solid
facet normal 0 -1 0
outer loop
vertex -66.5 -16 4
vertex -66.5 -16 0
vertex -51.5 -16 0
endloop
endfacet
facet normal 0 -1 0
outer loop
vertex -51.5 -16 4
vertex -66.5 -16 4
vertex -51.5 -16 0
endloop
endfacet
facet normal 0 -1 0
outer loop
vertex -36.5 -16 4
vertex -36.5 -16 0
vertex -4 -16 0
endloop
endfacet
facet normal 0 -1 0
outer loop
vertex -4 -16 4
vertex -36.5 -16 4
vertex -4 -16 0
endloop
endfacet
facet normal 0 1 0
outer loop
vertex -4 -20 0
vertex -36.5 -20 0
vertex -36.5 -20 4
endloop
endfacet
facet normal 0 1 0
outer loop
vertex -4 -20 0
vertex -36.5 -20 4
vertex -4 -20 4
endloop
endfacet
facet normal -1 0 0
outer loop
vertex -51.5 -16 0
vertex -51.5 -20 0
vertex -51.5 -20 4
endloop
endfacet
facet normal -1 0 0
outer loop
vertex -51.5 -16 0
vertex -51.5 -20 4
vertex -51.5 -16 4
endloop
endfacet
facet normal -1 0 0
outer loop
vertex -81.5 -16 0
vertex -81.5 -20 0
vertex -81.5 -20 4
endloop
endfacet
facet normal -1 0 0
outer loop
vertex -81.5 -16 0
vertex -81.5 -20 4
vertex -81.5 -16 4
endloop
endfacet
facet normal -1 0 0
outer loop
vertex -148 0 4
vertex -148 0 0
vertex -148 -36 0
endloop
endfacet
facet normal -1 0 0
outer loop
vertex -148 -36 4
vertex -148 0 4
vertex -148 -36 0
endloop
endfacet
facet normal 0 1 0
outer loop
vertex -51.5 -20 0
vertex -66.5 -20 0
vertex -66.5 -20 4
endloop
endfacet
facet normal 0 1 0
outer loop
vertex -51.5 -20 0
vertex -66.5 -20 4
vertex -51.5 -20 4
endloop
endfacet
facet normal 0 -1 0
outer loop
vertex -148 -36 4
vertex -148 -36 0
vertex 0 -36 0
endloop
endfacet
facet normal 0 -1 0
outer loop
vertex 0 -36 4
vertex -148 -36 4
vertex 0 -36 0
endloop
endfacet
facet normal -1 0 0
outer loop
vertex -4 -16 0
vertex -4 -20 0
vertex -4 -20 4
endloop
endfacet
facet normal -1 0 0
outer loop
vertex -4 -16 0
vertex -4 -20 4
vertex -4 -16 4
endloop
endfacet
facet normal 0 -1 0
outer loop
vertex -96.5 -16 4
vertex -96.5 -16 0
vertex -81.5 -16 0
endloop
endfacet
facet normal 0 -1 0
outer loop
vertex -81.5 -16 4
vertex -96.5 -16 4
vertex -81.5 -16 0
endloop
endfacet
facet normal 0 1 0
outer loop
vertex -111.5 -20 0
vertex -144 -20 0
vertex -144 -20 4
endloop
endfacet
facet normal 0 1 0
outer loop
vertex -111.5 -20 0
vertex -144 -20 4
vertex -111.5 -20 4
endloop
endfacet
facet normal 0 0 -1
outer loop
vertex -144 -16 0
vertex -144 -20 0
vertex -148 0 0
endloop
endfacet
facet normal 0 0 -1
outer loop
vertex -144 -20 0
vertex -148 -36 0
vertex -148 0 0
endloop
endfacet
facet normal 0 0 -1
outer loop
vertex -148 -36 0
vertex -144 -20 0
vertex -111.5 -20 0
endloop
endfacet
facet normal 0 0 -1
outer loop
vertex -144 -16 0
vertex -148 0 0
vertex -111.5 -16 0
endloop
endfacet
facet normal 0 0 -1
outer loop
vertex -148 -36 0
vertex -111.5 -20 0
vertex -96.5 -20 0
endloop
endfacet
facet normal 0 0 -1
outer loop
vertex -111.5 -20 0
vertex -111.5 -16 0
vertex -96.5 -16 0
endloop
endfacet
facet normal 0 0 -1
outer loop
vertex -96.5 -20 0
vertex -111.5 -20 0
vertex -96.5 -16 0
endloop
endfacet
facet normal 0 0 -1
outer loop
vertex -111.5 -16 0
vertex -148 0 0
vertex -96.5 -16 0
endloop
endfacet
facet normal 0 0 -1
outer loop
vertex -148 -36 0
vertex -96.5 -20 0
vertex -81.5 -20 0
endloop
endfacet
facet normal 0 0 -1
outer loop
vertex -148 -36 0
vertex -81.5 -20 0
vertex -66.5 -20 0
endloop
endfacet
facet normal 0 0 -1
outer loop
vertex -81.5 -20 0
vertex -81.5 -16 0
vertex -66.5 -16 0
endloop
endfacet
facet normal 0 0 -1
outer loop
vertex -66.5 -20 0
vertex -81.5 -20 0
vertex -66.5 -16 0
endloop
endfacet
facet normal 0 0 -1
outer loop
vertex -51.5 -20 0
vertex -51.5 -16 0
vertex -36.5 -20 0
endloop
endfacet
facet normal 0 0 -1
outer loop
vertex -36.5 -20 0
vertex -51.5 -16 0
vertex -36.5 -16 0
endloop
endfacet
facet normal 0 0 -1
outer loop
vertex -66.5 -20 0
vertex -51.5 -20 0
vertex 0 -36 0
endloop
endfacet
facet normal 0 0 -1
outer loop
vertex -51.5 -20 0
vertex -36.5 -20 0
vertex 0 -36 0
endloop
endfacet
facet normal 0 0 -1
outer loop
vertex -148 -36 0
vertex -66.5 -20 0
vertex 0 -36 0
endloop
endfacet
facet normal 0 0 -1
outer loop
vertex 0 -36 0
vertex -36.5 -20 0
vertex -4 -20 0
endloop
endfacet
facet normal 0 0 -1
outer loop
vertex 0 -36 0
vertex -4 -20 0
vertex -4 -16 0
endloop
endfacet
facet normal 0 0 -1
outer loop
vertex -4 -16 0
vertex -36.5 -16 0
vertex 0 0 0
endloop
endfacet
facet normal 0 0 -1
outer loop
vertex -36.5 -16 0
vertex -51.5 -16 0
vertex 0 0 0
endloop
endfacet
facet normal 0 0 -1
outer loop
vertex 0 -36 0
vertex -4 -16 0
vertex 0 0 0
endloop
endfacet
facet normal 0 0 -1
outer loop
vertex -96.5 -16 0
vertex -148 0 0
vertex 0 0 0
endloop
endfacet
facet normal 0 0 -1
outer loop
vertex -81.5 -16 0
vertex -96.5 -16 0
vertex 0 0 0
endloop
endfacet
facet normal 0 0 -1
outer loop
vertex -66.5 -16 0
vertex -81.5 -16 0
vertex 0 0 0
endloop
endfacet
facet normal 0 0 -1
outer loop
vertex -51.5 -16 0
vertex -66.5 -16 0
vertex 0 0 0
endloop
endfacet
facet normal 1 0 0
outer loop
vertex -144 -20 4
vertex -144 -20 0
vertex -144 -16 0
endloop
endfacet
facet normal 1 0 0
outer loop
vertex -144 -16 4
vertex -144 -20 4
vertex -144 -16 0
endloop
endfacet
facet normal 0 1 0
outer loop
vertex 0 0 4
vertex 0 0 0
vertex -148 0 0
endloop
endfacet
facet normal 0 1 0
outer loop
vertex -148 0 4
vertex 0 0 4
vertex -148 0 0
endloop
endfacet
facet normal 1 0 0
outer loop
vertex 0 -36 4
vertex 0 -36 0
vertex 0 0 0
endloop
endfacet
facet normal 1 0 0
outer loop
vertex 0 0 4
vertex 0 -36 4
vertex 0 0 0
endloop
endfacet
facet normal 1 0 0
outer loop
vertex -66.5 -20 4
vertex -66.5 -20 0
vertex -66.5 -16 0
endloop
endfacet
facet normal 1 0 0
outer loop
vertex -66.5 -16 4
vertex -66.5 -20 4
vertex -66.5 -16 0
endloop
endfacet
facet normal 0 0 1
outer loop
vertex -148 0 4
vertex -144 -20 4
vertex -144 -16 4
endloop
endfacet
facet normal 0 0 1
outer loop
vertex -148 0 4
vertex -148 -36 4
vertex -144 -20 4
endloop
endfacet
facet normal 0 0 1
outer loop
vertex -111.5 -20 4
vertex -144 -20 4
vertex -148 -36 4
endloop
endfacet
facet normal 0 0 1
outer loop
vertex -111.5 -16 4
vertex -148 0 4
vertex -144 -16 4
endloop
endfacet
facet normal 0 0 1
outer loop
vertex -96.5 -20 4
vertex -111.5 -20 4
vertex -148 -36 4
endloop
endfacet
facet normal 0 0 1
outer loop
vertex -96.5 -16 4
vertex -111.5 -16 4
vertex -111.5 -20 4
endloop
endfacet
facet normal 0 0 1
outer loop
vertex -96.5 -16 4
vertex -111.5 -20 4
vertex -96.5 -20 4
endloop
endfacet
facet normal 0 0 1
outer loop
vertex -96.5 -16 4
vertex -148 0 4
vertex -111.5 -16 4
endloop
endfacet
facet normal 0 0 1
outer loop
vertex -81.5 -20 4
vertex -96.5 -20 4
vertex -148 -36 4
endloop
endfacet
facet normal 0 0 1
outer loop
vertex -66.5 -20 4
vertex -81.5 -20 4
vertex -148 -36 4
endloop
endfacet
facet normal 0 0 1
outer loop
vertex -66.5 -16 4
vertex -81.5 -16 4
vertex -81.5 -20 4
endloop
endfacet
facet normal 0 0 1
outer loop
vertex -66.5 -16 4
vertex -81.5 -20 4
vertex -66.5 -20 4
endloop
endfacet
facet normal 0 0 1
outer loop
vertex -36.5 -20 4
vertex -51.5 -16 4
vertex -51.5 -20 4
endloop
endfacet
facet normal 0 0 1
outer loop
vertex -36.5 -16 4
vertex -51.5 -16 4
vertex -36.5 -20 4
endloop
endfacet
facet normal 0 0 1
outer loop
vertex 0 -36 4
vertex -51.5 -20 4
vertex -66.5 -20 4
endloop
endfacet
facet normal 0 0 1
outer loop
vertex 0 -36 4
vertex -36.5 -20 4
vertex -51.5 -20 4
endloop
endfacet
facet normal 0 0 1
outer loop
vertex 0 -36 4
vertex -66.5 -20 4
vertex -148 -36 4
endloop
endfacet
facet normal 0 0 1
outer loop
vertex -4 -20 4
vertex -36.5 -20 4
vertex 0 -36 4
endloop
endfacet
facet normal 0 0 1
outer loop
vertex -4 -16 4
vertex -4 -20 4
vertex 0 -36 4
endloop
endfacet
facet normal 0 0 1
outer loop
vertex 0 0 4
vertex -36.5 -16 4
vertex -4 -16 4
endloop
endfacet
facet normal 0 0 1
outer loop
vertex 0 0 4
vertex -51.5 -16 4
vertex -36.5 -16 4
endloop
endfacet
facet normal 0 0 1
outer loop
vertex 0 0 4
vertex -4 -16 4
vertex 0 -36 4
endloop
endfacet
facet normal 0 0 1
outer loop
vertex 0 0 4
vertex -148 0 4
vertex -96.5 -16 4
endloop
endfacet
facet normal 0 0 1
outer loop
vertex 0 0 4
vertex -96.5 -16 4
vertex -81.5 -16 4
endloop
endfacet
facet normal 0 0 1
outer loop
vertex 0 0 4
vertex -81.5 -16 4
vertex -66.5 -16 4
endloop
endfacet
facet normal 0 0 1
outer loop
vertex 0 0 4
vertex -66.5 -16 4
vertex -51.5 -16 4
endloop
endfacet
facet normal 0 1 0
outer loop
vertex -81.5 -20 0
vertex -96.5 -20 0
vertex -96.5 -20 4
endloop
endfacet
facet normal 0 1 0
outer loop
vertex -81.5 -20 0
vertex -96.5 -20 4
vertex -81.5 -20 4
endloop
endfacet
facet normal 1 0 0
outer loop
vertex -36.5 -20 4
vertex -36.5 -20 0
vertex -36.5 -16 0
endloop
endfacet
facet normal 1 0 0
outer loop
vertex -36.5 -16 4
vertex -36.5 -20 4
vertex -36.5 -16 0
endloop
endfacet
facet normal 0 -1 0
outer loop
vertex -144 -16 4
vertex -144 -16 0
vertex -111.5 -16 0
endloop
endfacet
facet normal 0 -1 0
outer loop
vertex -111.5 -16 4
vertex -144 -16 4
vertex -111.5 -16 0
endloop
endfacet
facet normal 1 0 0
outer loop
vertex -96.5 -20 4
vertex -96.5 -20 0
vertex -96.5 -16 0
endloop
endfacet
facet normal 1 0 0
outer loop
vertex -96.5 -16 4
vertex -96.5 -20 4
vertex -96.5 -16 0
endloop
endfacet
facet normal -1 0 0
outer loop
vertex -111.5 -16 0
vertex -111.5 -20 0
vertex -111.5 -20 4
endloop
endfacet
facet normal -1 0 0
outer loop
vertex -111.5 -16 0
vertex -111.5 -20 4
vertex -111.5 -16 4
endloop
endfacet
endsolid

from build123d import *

# Parameters (mm, degrees)
F0_W     = 32.5
F0_H     = 4
F0_W_2   = 15
F1_DEPTH = 4


with BuildPart() as f1:
    # F0 (on Top) → F1 (new body)
    with BuildSketch(Plane.XY):
        Polygon((0, -16), (0, 0), (-148, 0), (-148, -16), (-148, -20), (-148, -36), (0, -36), (0, -20), align=None)
        with Locations((-127.75, -18)):
            Rectangle(F0_W, F0_H, mode=Mode.SUBTRACT)
        with Locations((-89, -18)):
            Rectangle(F0_W_2, F0_H, mode=Mode.SUBTRACT)
        with Locations((-59, -18)):
            Rectangle(F0_W_2, F0_H, mode=Mode.SUBTRACT)
        with Locations((-20.25, -18)):
            Rectangle(F0_W, F0_H, mode=Mode.SUBTRACT)
    extrude(amount=F1_DEPTH)


solid = f1.part
